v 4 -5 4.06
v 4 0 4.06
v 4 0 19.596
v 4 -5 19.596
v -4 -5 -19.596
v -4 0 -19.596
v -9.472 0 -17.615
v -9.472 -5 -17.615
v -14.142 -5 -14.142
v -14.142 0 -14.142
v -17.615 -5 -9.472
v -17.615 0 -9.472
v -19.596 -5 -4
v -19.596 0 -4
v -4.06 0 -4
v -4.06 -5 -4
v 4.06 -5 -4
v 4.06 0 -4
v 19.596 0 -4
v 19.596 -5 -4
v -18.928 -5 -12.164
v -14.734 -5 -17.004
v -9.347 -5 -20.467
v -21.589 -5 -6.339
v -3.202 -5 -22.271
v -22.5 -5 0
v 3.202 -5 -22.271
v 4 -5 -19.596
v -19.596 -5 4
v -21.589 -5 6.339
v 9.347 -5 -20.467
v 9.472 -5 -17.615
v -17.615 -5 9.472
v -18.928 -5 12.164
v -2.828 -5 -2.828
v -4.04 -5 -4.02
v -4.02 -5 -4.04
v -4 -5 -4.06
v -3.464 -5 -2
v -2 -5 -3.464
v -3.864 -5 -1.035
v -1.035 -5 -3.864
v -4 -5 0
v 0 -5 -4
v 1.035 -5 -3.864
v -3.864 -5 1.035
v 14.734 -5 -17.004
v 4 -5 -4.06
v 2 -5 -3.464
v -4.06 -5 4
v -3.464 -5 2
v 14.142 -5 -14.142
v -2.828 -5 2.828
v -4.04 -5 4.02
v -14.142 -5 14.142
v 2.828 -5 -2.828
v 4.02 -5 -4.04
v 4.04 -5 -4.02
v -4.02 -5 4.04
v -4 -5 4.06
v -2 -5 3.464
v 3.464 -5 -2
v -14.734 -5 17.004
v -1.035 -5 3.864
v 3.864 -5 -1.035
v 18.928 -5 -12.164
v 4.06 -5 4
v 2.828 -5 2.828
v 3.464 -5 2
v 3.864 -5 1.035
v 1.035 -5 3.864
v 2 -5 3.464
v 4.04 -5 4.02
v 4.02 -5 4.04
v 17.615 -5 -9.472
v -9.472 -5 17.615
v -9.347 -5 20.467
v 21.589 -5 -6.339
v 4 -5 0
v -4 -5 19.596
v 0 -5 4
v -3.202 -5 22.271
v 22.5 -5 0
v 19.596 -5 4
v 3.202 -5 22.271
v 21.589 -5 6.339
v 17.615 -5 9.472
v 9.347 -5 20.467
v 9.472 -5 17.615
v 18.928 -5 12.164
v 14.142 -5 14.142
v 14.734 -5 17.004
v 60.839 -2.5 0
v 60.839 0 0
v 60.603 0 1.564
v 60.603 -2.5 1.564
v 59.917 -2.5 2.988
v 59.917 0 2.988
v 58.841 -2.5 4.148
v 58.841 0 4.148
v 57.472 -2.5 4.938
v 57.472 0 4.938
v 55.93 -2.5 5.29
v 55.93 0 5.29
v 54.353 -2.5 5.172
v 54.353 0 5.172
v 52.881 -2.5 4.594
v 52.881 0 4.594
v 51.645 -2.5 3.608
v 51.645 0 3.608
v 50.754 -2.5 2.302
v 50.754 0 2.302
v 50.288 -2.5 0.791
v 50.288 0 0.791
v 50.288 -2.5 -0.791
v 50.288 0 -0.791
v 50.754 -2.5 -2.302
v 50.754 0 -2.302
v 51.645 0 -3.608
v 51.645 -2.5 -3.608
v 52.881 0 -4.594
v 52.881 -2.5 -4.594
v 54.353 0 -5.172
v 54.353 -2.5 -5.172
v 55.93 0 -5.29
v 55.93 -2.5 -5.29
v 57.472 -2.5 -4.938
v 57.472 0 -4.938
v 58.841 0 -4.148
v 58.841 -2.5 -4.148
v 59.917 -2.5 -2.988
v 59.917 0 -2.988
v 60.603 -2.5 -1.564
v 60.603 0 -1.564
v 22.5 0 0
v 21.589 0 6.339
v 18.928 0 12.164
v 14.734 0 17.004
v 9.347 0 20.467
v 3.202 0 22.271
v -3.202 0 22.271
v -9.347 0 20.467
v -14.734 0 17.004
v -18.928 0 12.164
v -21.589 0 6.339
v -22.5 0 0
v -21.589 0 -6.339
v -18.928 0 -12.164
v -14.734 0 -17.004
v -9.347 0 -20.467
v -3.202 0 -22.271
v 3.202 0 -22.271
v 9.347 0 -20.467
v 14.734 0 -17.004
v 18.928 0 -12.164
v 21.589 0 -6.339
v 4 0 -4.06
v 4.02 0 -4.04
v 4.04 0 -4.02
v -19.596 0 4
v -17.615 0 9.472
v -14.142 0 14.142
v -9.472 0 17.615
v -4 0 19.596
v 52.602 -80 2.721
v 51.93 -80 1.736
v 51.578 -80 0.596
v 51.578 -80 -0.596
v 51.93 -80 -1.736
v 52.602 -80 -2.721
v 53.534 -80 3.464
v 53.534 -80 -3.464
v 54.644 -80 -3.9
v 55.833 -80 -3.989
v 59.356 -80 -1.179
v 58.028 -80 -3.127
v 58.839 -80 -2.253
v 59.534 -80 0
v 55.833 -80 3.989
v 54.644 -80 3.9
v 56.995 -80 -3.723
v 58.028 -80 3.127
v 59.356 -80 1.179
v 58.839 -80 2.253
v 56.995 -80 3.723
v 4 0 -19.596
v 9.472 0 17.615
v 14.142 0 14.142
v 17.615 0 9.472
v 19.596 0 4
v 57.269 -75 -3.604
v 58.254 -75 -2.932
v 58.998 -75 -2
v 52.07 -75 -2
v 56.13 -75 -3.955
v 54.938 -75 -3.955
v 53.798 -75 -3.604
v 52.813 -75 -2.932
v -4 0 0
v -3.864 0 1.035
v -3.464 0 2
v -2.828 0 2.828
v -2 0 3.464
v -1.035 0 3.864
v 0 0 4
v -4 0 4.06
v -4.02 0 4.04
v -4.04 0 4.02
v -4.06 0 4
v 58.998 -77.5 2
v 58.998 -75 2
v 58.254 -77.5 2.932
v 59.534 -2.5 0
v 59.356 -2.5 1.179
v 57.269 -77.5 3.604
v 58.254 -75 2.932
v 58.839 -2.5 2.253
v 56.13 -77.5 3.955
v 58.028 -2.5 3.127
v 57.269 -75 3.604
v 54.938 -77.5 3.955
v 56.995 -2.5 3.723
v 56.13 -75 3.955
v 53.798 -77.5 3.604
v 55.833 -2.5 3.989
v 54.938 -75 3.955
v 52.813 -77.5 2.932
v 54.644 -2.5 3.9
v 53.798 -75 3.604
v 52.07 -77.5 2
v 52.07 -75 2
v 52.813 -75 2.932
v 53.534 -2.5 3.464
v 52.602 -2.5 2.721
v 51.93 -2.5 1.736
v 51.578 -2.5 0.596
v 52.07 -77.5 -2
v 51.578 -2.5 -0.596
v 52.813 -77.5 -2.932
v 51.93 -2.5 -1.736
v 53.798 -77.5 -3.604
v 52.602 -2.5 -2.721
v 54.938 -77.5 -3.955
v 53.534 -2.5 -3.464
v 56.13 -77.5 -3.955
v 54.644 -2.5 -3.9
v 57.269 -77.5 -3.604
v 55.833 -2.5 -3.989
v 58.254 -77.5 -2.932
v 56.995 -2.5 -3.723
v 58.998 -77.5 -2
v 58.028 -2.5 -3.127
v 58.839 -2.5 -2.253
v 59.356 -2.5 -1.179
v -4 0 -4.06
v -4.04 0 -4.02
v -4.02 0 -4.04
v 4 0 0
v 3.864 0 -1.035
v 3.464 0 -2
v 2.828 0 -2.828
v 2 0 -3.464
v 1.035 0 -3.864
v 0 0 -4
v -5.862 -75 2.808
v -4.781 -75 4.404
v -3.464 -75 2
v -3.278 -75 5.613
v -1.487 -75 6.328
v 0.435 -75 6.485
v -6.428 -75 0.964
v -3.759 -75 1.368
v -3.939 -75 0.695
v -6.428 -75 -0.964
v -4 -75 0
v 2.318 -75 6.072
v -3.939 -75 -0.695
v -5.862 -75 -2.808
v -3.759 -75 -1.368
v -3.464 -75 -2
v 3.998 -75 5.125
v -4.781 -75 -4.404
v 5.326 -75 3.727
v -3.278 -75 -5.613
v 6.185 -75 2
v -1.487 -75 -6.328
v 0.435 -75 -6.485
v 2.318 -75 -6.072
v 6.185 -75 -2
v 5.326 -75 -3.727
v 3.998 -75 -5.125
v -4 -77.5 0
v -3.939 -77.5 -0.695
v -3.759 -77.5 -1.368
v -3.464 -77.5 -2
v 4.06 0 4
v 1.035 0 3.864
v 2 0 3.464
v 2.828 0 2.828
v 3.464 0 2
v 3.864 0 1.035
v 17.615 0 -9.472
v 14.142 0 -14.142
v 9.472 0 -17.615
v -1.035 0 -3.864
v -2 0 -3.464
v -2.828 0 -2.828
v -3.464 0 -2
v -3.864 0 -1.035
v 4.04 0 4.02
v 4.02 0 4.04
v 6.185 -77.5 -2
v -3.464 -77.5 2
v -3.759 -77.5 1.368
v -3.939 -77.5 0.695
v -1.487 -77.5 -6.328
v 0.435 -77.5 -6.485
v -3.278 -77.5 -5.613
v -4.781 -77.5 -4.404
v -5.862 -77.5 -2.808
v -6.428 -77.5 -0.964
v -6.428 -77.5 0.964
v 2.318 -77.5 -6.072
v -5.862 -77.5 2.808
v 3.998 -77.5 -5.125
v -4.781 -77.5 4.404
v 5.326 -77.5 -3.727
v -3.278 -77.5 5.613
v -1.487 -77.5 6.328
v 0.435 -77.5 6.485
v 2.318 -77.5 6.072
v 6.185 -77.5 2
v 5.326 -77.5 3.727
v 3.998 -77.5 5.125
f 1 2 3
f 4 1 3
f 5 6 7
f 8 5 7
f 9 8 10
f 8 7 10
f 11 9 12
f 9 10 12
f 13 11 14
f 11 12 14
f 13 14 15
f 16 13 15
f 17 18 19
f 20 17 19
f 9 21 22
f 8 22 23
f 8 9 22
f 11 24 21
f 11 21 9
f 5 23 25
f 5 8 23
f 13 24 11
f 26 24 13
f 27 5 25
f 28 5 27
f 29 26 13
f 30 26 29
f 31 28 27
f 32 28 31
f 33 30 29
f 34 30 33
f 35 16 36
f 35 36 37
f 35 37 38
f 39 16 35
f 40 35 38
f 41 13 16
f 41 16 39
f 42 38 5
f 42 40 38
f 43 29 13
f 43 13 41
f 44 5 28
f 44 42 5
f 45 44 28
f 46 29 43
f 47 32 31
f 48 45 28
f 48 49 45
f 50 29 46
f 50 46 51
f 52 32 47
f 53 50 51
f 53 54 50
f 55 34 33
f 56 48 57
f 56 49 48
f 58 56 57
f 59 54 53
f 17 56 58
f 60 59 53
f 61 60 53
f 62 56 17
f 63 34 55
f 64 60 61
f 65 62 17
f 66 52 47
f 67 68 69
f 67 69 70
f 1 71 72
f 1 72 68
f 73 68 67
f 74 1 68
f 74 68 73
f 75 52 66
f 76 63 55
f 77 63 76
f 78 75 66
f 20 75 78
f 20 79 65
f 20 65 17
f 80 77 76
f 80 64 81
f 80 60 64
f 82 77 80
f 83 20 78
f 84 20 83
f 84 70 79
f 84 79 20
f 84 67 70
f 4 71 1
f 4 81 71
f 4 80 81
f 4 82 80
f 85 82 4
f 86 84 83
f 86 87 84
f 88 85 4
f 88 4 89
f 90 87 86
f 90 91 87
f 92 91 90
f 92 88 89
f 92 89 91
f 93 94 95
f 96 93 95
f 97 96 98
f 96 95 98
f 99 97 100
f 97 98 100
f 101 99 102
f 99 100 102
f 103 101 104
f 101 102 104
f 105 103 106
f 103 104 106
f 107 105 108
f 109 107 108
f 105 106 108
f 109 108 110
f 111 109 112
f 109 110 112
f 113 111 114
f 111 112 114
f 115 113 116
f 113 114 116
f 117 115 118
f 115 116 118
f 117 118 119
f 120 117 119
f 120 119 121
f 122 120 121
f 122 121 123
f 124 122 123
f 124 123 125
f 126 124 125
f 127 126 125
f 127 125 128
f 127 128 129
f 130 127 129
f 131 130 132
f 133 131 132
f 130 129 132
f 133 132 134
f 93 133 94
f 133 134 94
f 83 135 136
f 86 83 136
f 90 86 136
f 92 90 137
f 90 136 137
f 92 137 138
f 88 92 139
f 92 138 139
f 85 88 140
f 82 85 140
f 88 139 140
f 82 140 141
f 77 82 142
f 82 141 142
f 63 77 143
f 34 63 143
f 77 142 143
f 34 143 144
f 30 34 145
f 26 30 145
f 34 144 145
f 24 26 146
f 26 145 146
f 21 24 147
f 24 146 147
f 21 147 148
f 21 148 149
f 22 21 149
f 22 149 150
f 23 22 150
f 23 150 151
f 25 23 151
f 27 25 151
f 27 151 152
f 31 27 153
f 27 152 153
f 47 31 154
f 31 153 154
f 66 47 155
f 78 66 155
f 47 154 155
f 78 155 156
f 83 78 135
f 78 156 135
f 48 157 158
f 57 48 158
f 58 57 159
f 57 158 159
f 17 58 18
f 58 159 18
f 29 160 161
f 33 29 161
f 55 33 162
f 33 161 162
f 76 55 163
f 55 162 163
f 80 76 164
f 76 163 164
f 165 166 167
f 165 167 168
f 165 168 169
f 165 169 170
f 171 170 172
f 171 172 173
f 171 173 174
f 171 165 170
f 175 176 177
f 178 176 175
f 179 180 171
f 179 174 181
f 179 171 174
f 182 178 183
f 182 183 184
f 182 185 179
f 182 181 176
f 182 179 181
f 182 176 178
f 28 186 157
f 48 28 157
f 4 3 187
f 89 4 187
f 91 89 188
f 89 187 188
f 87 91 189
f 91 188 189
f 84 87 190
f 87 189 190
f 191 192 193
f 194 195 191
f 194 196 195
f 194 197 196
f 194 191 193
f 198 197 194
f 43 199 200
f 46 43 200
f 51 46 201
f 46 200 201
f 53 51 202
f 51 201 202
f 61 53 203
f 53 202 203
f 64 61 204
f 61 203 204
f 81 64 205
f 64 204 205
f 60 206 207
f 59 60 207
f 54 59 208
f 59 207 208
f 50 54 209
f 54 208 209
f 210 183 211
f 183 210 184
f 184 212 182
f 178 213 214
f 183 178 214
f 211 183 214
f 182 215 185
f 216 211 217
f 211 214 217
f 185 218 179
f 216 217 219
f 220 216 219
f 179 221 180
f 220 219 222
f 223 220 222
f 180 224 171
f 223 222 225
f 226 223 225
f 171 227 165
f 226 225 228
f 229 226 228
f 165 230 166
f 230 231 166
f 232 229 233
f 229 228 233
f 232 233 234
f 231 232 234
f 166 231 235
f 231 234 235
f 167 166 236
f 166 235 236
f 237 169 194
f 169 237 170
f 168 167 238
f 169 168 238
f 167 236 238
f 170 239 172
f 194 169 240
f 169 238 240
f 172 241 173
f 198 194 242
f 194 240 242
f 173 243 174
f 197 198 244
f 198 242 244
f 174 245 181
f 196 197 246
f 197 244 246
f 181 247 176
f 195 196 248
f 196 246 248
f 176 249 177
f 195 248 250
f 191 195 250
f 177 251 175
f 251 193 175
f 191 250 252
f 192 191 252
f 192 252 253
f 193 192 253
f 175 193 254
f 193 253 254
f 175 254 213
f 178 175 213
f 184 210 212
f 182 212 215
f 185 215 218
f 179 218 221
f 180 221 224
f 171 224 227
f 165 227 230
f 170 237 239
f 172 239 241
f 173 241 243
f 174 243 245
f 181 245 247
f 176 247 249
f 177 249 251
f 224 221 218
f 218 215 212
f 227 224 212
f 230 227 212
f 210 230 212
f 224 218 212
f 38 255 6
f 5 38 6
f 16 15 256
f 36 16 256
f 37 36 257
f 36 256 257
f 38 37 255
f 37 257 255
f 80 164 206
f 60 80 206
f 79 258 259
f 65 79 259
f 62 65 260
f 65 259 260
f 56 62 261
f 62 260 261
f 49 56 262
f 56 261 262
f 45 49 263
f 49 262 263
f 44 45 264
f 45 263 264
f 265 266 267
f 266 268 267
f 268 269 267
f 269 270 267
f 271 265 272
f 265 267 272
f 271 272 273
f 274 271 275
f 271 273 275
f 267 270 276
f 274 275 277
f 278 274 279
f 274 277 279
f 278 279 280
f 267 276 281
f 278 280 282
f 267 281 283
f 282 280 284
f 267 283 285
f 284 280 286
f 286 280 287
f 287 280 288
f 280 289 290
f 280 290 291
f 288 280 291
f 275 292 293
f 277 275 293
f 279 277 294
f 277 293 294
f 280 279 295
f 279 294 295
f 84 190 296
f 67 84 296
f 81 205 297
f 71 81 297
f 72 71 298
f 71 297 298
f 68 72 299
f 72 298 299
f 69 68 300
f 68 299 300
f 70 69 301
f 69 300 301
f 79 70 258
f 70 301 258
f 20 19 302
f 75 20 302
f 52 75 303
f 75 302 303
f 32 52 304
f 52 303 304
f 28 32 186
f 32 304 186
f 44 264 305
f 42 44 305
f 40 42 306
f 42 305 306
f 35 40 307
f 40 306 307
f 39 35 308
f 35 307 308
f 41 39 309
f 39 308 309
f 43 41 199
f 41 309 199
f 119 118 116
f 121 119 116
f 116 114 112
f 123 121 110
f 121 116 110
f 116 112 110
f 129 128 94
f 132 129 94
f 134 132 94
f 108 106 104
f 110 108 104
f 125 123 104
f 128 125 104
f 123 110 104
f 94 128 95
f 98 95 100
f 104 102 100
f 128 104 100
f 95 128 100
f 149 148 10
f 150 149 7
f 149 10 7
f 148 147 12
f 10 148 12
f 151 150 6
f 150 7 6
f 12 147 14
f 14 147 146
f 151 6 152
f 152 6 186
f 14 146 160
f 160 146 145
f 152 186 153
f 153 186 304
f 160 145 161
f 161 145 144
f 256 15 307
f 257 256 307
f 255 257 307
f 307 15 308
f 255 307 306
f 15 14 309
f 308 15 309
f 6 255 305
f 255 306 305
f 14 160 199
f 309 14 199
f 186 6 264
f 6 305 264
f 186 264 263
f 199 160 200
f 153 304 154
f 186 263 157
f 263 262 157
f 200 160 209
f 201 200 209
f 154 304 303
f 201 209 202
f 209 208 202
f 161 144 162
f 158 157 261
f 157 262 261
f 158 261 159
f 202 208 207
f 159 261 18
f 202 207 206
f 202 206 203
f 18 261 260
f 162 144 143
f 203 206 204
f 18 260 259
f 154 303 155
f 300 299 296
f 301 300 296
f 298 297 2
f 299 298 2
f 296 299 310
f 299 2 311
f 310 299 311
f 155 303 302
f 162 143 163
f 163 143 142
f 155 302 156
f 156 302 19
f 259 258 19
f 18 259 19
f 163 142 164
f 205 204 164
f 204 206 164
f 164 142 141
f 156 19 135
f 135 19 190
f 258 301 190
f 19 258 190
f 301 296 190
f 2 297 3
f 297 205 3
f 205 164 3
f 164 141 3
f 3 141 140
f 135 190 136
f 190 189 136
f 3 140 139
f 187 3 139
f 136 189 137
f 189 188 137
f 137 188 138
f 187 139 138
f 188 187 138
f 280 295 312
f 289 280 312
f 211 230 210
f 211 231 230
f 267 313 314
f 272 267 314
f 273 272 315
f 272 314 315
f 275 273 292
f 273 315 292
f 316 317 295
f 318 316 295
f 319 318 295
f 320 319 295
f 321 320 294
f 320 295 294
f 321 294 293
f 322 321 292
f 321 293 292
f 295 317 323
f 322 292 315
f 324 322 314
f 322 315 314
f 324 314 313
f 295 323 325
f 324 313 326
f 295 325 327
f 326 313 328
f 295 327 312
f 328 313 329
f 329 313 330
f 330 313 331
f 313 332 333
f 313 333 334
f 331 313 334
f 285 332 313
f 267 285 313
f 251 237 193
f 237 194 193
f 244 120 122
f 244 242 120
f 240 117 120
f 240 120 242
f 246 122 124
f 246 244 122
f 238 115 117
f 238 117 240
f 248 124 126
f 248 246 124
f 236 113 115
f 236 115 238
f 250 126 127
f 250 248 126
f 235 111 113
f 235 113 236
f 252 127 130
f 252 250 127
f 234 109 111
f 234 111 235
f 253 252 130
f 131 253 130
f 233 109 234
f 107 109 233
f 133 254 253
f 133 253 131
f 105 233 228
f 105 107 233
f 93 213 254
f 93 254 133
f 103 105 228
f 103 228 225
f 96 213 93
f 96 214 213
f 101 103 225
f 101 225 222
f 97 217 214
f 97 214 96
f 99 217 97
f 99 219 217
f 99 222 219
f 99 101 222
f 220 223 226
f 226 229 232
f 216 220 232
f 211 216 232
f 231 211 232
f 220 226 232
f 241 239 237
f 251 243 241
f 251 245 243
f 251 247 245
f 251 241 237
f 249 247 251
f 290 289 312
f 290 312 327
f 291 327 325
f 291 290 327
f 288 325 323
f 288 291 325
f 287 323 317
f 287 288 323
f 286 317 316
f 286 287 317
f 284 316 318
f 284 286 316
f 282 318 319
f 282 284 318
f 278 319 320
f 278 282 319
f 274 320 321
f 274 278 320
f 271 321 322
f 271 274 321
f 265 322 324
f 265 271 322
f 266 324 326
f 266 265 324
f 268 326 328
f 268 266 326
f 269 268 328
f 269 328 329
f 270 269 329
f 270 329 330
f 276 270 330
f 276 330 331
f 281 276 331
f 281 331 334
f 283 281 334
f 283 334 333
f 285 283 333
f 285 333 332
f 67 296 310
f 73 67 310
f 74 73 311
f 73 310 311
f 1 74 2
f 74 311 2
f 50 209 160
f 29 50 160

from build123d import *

# Parameters (mm, degrees)
F0_R      = 22.5
F1_DEPTH  = 5
F0_R_2    = 4
F2_DEPTH  = 80
F0_R_3    = 5.3049269063
F3_DEPTH  = 2.5
F6_W      = 4
F6_H      = 2.5
F7_DEPTH  = 2
F9_W      = 4
F9_H      = 2.5
F10_DEPTH = 2
F11_W     = 2.5
F11_H     = 2
F11_H_2   = 2.5
F14_DEPTH = 25


with BuildPart() as f1:
    # F0 (on Front) → F1 (new body)
    with BuildSketch(Plane.XZ):
        Circle(F0_R)
        with BuildLine():
            ThreePointArc((19.5959179423, 4), (19.8987230601, 2.0101792401), (20, 0))
            ThreePointArc((20, 0), (19.8987230601, -2.0101792401), (19.5959179423, -4))
            ThreePointArc((19.5959179423, -4), (14.1421356237, -14.1421356237), (4, -19.5959179423))
            ThreePointArc((4, -19.5959179423), (2.0101792401, -19.8987230601), (0, -20))
            ThreePointArc((0, -20), (-2.0101792401, -19.8987230601), (-4, -19.5959179423))
            ThreePointArc((-4, -19.5959179423), (-14.1421356237, -14.1421356237), (-19.5959179423, -4))
            ThreePointArc((-19.5959179423, -4), (-19.8987230601, -2.0101792401), (-20, 0))
            ThreePointArc((-20, 0), (-19.8987230601, 2.0101792401), (-19.5959179423, 4))
            ThreePointArc((-19.5959179423, 4), (-14.1421356237, 14.1421356237), (-4, 19.5959179423))
            ThreePointArc((-4, 19.5959179423), (-2.0101792401, 19.8987230601), (0, 20))
            ThreePointArc((0, 20), (2.0101792401, 19.8987230601), (4, 19.5959179423))
            ThreePointArc((4, 19.5959179423), (14.1421356237, 14.1421356237), (19.5959179423, 4))
        make_face(mode=Mode.SUBTRACT)
        with BuildLine():
            Line((-4.0603872565, 4), (-19.5959179423, 4))
            ThreePointArc((-19.5959179423, 4), (-19.8987230601, 2.0101792401), (-20, 0))
            Line((-20, 0), (-5.6997144378, 0))
            ThreePointArc((-5.6997144378, 0), (-5.2739829608, 2.1614459054), (-4.0603872565, 4))
        make_face()
        with BuildLine():
            Line((-4, 4), (0, 4))
            Line((0, 4), (0, 5.6997144378))
            ThreePointArc((0, 5.6997144378), (-2.1614459054, 5.2739829608), (-4, 4.0603872565))
            Line((-4, 4.0603872565), (-4, 4))
        make_face()
        with BuildLine():
            Line((0, 5.6997144378), (0, 20))
            ThreePointArc((0, 20), (-2.0101792401, 19.8987230601), (-4, 19.5959179423))
            Line((-4, 19.5959179423), (-4, 4.0603872565))
            ThreePointArc((-4, 4.0603872565), (-2.1614459054, 5.2739829608), (0, 5.6997144378))
        make_face()
        with BuildLine():
            Line((4, 4), (4, 4.0603872565))
            ThreePointArc((4, 4.0603872565), (2.1614459054, 5.2739829608), (0, 5.6997144378))
            Line((0, 5.6997144378), (0, 4))
            Line((0, 4), (4, 4))
        make_face()
        with BuildLine():
            Line((4, 4.0603872565), (4, 19.5959179423))
            ThreePointArc((4, 19.5959179423), (2.0101792401, 19.8987230601), (0, 20))
            Line((0, 20), (0, 5.6997144378))
            ThreePointArc((0, 5.6997144378), (2.1614459054, 5.2739829608), (4, 4.0603872565))
        make_face()
        with BuildLine():
            ThreePointArc((-20, 0), (-19.8987230601, -2.0101792401), (-19.5959179423, -4))
            Line((-19.5959179423, -4), (-4.0603872565, -4))
            ThreePointArc((-4.0603872565, -4), (-5.2739829608, -2.1614459054), (-5.6997144378, 0))
            Line((-5.6997144378, 0), (-20, 0))
        make_face()
        with BuildLine():
            ThreePointArc((0, 4), (2.8284271247, 2.8284271247), (4, 0))
            Line((4, 0), (4, 4))
            Line((4, 4), (0, 4))
        make_face()
        with BuildLine():
            Line((5.6997144378, 0), (20, 0))
            ThreePointArc((20, 0), (19.8987230601, 2.0101792401), (19.5959179423, 4))
            Line((19.5959179423, 4), (4.0603872565, 4))
            ThreePointArc((4.0603872565, 4), (5.2739829608, 2.1614459054), (5.6997144378, 0))
        make_face()
        with BuildLine():
            ThreePointArc((-4, 0), (-2.8284271247, 2.8284271247), (0, 4))
            Line((0, 4), (-4, 4))
            Line((-4, 4), (-4, 0))
        make_face()
        with BuildLine():
            Line((-4, -4), (0, -4))
            ThreePointArc((0, -4), (-2.8284271247, -2.8284271247), (-4, 0))
            Line((-4, 0), (-4, -4))
        make_face()
        with BuildLine():
            Line((4, -4), (4, 0))
            ThreePointArc((4, 0), (2.8284271247, -2.8284271247), (0, -4))
            Line((0, -4), (4, -4))
        make_face()
        with BuildLine():
            ThreePointArc((19.5959179423, -4), (19.8987230601, -2.0101792401), (20, 0))
            Line((20, 0), (5.6997144378, 0))
            ThreePointArc((5.6997144378, 0), (5.2739829608, -2.1614459054), (4.0603872565, -4))
            Line((4.0603872565, -4), (19.5959179423, -4))
        make_face()
        with BuildLine():
            ThreePointArc((0, -5.6997144378), (2.1614459054, -5.2739829608), (4, -4.0603872565))
            Line((4, -4.0603872565), (4, -4))
            Line((4, -4), (0, -4))
            Line((0, -4), (0, -5.6997144378))
        make_face()
        with BuildLine():
            ThreePointArc((0, -20), (2.0101792401, -19.8987230601), (4, -19.5959179423))
            Line((4, -19.5959179423), (4, -4.0603872565))
            ThreePointArc((4, -4.0603872565), (2.1614459054, -5.2739829608), (0, -5.6997144378))
            Line((0, -5.6997144378), (0, -20))
        make_face()
        with BuildLine():
            Line((0, -5.6997144378), (0, -4))
            Line((0, -4), (-4, -4))
            Line((-4, -4), (-4, -4.0603872565))
            ThreePointArc((-4, -4.0603872565), (-2.1614459054, -5.2739829608), (0, -5.6997144378))
        make_face()
        with BuildLine():
            ThreePointArc((-4, -19.5959179423), (-2.0101792401, -19.8987230601), (0, -20))
            Line((0, -20), (0, -5.6997144378))
            ThreePointArc((0, -5.6997144378), (-2.1614459054, -5.2739829608), (-4, -4.0603872565))
            Line((-4, -4.0603872565), (-4, -19.5959179423))
        make_face()
        with BuildLine():
            Line((-5.6997144378, 0), (-4, 0))
            Line((-4, 0), (-4, 4))
            Line((-4, 4), (-4.0603872565, 4))
            ThreePointArc((-4.0603872565, 4), (-5.2739829608, 2.1614459054), (-5.6997144378, 0))
        make_face()
        with BuildLine():
            Line((-4, -4), (-4, 0))
            Line((-4, 0), (-5.6997144378, 0))
            ThreePointArc((-5.6997144378, 0), (-5.2739829608, -2.1614459054), (-4.0603872565, -4))
            Line((-4.0603872565, -4), (-4, -4))
        make_face()
        with BuildLine():
            Line((-4.0603872565, 4), (-4, 4))
            Line((-4, 4), (-4, 4.0603872565))
            ThreePointArc((-4, 4.0603872565), (-4.0303067298, 4.0303067298), (-4.0603872565, 4))
        make_face()
        with BuildLine():
            Line((4, 4), (4.0603872565, 4))
            ThreePointArc((4.0603872565, 4), (4.0303067298, 4.0303067298), (4, 4.0603872565))
            Line((4, 4.0603872565), (4, 4))
        make_face()
        with BuildLine():
            ThreePointArc((4, -4.0603872565), (4.0303067298, -4.0303067298), (4.0603872565, -4))
            Line((4.0603872565, -4), (4, -4))
            Line((4, -4), (4, -4.0603872565))
        make_face()
        with BuildLine():
            ThreePointArc((4.0603872565, -4), (5.2739829608, -2.1614459054), (5.6997144378, 0))
            Line((5.6997144378, 0), (4, 0))
            Line((4, 0), (4, -4))
            Line((4, -4), (4.0603872565, -4))
        make_face()
        with BuildLine():
            Line((4, 0), (5.6997144378, 0))
            ThreePointArc((5.6997144378, 0), (5.2739829608, 2.1614459054), (4.0603872565, 4))
            Line((4.0603872565, 4), (4, 4))
            Line((4, 4), (4, 0))
        make_face()
        with BuildLine():
            Line((-4, -4.0603872565), (-4, -4))
            Line((-4, -4), (-4.0603872565, -4))
            ThreePointArc((-4.0603872565, -4), (-4.0303067298, -4.0303067298), (-4, -4.0603872565))
        make_face()
    extrude(amount=F1_DEPTH)


with BuildPart() as f2:
    # F0 (on Front) → F2 (new body)
    with BuildSketch(Plane.XZ):
        with Locations((55.5337630212, 0)):
            Circle(F0_R_2)
    extrude(amount=F2_DEPTH)

    # F0 (on Front) → F3 (join)
    with BuildSketch(Plane.XZ):
        with Locations((55.5337630212, 0)):
            Circle(F0_R_3)
        with Locations((55.5337630212, 0)):
            Circle(F0_R_2, mode=Mode.SUBTRACT)
    extrude(amount=F3_DEPTH)

    # F6 (on offset) → F7 (cut)
    with BuildSketch(Plane.XY.offset(4)):
        with Locations((57.5337630212, -76.25)):
            Rectangle(F6_W, F6_H)
        with Locations((53.5337630212, -76.25)):
            Rectangle(F6_W, F6_H)
    extrude(amount=-F7_DEPTH, mode=Mode.SUBTRACT)

    # F9 (on offset) → F10 (cut)
    with BuildSketch(Plane.XY.offset(-4)):
        with Locations((57.5337630212, -76.25)):
            Rectangle(F9_W, F9_H)
        with Locations((53.5337630212, -76.25)):
            Rectangle(F9_W, F9_H)
    extrude(amount=F10_DEPTH, mode=Mode.SUBTRACT)


with BuildPart() as f12:
    # F11 (on Right) → F12 (revolve)
    with BuildSketch(Plane.YZ):
        with Locations((-76.25, 1)):
            Rectangle(F11_W, F11_H)
        with Locations((-76.25, 3)):
            Rectangle(F11_W, F11_H)
        with Locations((-76.25, 5.25)):
            Rectangle(F11_W, F11_H_2)
    revolve(axis=Axis((0, -76.25, 0), (0, 1, 0)))

    # F13 (on face) → F14 (cut)
    with BuildSketch(Plane.XZ.offset(77.5)):
        with BuildLine():
            ThreePointArc((4, 0), (3.8637033052, 1.0352761804), (3.4641016151, 2))
            Line((3.4641016151, 2), (0, 2))
            Line((0, 2), (0, 0))
            Line((0, 0), (4, 0))
        make_face()
        with BuildLine():
            Line((6.1846584384, 2), (3.4641016151, 2))
            ThreePointArc((3.4641016151, 2), (3.8637033052, 1.0352761804), (4, 0))
            Line((4, 0), (6.5, 0))
            ThreePointArc((6.5, 0), (6.4206806434, 1.0123537302), (6.1846584384, 2))
        make_face()
        with BuildLine():
            ThreePointArc((3.4641016151, -2), (3.8637033052, -1.0352761804), (4, 0))
            Line((4, 0), (0, 0))
            Line((0, 0), (0, -2))
            Line((0, -2), (3.4641016151, -2))
        make_face()
        with BuildLine():
            Line((0, 0), (-4, 0))
            ThreePointArc((-4, 0), (-3.8637033052, -1.0352761804), (-3.4641016151, -2))
            Line((-3.4641016151, -2), (0, -2))
            Line((0, -2), (0, 0))
        make_face()
        with BuildLine():
            Line((0, 2), (-3.4641016151, 2))
            ThreePointArc((-3.4641016151, 2), (-3.8637033052, 1.0352761804), (-4, 0))
            Line((-4, 0), (0, 0))
            Line((0, 0), (0, 2))
        make_face()
        with BuildLine():
            Line((6.5, 0), (4, 0))
            ThreePointArc((4, 0), (3.8637033052, -1.0352761804), (3.4641016151, -2))
            Line((3.4641016151, -2), (6.1846584384, -2))
            ThreePointArc((6.1846584384, -2), (6.4206806434, -1.0123537302), (6.5, 0))
        make_face()
    extrude(amount=-F14_DEPTH, mode=Mode.SUBTRACT)


solid = Compound([f1.part, f2.part, f12.part])
